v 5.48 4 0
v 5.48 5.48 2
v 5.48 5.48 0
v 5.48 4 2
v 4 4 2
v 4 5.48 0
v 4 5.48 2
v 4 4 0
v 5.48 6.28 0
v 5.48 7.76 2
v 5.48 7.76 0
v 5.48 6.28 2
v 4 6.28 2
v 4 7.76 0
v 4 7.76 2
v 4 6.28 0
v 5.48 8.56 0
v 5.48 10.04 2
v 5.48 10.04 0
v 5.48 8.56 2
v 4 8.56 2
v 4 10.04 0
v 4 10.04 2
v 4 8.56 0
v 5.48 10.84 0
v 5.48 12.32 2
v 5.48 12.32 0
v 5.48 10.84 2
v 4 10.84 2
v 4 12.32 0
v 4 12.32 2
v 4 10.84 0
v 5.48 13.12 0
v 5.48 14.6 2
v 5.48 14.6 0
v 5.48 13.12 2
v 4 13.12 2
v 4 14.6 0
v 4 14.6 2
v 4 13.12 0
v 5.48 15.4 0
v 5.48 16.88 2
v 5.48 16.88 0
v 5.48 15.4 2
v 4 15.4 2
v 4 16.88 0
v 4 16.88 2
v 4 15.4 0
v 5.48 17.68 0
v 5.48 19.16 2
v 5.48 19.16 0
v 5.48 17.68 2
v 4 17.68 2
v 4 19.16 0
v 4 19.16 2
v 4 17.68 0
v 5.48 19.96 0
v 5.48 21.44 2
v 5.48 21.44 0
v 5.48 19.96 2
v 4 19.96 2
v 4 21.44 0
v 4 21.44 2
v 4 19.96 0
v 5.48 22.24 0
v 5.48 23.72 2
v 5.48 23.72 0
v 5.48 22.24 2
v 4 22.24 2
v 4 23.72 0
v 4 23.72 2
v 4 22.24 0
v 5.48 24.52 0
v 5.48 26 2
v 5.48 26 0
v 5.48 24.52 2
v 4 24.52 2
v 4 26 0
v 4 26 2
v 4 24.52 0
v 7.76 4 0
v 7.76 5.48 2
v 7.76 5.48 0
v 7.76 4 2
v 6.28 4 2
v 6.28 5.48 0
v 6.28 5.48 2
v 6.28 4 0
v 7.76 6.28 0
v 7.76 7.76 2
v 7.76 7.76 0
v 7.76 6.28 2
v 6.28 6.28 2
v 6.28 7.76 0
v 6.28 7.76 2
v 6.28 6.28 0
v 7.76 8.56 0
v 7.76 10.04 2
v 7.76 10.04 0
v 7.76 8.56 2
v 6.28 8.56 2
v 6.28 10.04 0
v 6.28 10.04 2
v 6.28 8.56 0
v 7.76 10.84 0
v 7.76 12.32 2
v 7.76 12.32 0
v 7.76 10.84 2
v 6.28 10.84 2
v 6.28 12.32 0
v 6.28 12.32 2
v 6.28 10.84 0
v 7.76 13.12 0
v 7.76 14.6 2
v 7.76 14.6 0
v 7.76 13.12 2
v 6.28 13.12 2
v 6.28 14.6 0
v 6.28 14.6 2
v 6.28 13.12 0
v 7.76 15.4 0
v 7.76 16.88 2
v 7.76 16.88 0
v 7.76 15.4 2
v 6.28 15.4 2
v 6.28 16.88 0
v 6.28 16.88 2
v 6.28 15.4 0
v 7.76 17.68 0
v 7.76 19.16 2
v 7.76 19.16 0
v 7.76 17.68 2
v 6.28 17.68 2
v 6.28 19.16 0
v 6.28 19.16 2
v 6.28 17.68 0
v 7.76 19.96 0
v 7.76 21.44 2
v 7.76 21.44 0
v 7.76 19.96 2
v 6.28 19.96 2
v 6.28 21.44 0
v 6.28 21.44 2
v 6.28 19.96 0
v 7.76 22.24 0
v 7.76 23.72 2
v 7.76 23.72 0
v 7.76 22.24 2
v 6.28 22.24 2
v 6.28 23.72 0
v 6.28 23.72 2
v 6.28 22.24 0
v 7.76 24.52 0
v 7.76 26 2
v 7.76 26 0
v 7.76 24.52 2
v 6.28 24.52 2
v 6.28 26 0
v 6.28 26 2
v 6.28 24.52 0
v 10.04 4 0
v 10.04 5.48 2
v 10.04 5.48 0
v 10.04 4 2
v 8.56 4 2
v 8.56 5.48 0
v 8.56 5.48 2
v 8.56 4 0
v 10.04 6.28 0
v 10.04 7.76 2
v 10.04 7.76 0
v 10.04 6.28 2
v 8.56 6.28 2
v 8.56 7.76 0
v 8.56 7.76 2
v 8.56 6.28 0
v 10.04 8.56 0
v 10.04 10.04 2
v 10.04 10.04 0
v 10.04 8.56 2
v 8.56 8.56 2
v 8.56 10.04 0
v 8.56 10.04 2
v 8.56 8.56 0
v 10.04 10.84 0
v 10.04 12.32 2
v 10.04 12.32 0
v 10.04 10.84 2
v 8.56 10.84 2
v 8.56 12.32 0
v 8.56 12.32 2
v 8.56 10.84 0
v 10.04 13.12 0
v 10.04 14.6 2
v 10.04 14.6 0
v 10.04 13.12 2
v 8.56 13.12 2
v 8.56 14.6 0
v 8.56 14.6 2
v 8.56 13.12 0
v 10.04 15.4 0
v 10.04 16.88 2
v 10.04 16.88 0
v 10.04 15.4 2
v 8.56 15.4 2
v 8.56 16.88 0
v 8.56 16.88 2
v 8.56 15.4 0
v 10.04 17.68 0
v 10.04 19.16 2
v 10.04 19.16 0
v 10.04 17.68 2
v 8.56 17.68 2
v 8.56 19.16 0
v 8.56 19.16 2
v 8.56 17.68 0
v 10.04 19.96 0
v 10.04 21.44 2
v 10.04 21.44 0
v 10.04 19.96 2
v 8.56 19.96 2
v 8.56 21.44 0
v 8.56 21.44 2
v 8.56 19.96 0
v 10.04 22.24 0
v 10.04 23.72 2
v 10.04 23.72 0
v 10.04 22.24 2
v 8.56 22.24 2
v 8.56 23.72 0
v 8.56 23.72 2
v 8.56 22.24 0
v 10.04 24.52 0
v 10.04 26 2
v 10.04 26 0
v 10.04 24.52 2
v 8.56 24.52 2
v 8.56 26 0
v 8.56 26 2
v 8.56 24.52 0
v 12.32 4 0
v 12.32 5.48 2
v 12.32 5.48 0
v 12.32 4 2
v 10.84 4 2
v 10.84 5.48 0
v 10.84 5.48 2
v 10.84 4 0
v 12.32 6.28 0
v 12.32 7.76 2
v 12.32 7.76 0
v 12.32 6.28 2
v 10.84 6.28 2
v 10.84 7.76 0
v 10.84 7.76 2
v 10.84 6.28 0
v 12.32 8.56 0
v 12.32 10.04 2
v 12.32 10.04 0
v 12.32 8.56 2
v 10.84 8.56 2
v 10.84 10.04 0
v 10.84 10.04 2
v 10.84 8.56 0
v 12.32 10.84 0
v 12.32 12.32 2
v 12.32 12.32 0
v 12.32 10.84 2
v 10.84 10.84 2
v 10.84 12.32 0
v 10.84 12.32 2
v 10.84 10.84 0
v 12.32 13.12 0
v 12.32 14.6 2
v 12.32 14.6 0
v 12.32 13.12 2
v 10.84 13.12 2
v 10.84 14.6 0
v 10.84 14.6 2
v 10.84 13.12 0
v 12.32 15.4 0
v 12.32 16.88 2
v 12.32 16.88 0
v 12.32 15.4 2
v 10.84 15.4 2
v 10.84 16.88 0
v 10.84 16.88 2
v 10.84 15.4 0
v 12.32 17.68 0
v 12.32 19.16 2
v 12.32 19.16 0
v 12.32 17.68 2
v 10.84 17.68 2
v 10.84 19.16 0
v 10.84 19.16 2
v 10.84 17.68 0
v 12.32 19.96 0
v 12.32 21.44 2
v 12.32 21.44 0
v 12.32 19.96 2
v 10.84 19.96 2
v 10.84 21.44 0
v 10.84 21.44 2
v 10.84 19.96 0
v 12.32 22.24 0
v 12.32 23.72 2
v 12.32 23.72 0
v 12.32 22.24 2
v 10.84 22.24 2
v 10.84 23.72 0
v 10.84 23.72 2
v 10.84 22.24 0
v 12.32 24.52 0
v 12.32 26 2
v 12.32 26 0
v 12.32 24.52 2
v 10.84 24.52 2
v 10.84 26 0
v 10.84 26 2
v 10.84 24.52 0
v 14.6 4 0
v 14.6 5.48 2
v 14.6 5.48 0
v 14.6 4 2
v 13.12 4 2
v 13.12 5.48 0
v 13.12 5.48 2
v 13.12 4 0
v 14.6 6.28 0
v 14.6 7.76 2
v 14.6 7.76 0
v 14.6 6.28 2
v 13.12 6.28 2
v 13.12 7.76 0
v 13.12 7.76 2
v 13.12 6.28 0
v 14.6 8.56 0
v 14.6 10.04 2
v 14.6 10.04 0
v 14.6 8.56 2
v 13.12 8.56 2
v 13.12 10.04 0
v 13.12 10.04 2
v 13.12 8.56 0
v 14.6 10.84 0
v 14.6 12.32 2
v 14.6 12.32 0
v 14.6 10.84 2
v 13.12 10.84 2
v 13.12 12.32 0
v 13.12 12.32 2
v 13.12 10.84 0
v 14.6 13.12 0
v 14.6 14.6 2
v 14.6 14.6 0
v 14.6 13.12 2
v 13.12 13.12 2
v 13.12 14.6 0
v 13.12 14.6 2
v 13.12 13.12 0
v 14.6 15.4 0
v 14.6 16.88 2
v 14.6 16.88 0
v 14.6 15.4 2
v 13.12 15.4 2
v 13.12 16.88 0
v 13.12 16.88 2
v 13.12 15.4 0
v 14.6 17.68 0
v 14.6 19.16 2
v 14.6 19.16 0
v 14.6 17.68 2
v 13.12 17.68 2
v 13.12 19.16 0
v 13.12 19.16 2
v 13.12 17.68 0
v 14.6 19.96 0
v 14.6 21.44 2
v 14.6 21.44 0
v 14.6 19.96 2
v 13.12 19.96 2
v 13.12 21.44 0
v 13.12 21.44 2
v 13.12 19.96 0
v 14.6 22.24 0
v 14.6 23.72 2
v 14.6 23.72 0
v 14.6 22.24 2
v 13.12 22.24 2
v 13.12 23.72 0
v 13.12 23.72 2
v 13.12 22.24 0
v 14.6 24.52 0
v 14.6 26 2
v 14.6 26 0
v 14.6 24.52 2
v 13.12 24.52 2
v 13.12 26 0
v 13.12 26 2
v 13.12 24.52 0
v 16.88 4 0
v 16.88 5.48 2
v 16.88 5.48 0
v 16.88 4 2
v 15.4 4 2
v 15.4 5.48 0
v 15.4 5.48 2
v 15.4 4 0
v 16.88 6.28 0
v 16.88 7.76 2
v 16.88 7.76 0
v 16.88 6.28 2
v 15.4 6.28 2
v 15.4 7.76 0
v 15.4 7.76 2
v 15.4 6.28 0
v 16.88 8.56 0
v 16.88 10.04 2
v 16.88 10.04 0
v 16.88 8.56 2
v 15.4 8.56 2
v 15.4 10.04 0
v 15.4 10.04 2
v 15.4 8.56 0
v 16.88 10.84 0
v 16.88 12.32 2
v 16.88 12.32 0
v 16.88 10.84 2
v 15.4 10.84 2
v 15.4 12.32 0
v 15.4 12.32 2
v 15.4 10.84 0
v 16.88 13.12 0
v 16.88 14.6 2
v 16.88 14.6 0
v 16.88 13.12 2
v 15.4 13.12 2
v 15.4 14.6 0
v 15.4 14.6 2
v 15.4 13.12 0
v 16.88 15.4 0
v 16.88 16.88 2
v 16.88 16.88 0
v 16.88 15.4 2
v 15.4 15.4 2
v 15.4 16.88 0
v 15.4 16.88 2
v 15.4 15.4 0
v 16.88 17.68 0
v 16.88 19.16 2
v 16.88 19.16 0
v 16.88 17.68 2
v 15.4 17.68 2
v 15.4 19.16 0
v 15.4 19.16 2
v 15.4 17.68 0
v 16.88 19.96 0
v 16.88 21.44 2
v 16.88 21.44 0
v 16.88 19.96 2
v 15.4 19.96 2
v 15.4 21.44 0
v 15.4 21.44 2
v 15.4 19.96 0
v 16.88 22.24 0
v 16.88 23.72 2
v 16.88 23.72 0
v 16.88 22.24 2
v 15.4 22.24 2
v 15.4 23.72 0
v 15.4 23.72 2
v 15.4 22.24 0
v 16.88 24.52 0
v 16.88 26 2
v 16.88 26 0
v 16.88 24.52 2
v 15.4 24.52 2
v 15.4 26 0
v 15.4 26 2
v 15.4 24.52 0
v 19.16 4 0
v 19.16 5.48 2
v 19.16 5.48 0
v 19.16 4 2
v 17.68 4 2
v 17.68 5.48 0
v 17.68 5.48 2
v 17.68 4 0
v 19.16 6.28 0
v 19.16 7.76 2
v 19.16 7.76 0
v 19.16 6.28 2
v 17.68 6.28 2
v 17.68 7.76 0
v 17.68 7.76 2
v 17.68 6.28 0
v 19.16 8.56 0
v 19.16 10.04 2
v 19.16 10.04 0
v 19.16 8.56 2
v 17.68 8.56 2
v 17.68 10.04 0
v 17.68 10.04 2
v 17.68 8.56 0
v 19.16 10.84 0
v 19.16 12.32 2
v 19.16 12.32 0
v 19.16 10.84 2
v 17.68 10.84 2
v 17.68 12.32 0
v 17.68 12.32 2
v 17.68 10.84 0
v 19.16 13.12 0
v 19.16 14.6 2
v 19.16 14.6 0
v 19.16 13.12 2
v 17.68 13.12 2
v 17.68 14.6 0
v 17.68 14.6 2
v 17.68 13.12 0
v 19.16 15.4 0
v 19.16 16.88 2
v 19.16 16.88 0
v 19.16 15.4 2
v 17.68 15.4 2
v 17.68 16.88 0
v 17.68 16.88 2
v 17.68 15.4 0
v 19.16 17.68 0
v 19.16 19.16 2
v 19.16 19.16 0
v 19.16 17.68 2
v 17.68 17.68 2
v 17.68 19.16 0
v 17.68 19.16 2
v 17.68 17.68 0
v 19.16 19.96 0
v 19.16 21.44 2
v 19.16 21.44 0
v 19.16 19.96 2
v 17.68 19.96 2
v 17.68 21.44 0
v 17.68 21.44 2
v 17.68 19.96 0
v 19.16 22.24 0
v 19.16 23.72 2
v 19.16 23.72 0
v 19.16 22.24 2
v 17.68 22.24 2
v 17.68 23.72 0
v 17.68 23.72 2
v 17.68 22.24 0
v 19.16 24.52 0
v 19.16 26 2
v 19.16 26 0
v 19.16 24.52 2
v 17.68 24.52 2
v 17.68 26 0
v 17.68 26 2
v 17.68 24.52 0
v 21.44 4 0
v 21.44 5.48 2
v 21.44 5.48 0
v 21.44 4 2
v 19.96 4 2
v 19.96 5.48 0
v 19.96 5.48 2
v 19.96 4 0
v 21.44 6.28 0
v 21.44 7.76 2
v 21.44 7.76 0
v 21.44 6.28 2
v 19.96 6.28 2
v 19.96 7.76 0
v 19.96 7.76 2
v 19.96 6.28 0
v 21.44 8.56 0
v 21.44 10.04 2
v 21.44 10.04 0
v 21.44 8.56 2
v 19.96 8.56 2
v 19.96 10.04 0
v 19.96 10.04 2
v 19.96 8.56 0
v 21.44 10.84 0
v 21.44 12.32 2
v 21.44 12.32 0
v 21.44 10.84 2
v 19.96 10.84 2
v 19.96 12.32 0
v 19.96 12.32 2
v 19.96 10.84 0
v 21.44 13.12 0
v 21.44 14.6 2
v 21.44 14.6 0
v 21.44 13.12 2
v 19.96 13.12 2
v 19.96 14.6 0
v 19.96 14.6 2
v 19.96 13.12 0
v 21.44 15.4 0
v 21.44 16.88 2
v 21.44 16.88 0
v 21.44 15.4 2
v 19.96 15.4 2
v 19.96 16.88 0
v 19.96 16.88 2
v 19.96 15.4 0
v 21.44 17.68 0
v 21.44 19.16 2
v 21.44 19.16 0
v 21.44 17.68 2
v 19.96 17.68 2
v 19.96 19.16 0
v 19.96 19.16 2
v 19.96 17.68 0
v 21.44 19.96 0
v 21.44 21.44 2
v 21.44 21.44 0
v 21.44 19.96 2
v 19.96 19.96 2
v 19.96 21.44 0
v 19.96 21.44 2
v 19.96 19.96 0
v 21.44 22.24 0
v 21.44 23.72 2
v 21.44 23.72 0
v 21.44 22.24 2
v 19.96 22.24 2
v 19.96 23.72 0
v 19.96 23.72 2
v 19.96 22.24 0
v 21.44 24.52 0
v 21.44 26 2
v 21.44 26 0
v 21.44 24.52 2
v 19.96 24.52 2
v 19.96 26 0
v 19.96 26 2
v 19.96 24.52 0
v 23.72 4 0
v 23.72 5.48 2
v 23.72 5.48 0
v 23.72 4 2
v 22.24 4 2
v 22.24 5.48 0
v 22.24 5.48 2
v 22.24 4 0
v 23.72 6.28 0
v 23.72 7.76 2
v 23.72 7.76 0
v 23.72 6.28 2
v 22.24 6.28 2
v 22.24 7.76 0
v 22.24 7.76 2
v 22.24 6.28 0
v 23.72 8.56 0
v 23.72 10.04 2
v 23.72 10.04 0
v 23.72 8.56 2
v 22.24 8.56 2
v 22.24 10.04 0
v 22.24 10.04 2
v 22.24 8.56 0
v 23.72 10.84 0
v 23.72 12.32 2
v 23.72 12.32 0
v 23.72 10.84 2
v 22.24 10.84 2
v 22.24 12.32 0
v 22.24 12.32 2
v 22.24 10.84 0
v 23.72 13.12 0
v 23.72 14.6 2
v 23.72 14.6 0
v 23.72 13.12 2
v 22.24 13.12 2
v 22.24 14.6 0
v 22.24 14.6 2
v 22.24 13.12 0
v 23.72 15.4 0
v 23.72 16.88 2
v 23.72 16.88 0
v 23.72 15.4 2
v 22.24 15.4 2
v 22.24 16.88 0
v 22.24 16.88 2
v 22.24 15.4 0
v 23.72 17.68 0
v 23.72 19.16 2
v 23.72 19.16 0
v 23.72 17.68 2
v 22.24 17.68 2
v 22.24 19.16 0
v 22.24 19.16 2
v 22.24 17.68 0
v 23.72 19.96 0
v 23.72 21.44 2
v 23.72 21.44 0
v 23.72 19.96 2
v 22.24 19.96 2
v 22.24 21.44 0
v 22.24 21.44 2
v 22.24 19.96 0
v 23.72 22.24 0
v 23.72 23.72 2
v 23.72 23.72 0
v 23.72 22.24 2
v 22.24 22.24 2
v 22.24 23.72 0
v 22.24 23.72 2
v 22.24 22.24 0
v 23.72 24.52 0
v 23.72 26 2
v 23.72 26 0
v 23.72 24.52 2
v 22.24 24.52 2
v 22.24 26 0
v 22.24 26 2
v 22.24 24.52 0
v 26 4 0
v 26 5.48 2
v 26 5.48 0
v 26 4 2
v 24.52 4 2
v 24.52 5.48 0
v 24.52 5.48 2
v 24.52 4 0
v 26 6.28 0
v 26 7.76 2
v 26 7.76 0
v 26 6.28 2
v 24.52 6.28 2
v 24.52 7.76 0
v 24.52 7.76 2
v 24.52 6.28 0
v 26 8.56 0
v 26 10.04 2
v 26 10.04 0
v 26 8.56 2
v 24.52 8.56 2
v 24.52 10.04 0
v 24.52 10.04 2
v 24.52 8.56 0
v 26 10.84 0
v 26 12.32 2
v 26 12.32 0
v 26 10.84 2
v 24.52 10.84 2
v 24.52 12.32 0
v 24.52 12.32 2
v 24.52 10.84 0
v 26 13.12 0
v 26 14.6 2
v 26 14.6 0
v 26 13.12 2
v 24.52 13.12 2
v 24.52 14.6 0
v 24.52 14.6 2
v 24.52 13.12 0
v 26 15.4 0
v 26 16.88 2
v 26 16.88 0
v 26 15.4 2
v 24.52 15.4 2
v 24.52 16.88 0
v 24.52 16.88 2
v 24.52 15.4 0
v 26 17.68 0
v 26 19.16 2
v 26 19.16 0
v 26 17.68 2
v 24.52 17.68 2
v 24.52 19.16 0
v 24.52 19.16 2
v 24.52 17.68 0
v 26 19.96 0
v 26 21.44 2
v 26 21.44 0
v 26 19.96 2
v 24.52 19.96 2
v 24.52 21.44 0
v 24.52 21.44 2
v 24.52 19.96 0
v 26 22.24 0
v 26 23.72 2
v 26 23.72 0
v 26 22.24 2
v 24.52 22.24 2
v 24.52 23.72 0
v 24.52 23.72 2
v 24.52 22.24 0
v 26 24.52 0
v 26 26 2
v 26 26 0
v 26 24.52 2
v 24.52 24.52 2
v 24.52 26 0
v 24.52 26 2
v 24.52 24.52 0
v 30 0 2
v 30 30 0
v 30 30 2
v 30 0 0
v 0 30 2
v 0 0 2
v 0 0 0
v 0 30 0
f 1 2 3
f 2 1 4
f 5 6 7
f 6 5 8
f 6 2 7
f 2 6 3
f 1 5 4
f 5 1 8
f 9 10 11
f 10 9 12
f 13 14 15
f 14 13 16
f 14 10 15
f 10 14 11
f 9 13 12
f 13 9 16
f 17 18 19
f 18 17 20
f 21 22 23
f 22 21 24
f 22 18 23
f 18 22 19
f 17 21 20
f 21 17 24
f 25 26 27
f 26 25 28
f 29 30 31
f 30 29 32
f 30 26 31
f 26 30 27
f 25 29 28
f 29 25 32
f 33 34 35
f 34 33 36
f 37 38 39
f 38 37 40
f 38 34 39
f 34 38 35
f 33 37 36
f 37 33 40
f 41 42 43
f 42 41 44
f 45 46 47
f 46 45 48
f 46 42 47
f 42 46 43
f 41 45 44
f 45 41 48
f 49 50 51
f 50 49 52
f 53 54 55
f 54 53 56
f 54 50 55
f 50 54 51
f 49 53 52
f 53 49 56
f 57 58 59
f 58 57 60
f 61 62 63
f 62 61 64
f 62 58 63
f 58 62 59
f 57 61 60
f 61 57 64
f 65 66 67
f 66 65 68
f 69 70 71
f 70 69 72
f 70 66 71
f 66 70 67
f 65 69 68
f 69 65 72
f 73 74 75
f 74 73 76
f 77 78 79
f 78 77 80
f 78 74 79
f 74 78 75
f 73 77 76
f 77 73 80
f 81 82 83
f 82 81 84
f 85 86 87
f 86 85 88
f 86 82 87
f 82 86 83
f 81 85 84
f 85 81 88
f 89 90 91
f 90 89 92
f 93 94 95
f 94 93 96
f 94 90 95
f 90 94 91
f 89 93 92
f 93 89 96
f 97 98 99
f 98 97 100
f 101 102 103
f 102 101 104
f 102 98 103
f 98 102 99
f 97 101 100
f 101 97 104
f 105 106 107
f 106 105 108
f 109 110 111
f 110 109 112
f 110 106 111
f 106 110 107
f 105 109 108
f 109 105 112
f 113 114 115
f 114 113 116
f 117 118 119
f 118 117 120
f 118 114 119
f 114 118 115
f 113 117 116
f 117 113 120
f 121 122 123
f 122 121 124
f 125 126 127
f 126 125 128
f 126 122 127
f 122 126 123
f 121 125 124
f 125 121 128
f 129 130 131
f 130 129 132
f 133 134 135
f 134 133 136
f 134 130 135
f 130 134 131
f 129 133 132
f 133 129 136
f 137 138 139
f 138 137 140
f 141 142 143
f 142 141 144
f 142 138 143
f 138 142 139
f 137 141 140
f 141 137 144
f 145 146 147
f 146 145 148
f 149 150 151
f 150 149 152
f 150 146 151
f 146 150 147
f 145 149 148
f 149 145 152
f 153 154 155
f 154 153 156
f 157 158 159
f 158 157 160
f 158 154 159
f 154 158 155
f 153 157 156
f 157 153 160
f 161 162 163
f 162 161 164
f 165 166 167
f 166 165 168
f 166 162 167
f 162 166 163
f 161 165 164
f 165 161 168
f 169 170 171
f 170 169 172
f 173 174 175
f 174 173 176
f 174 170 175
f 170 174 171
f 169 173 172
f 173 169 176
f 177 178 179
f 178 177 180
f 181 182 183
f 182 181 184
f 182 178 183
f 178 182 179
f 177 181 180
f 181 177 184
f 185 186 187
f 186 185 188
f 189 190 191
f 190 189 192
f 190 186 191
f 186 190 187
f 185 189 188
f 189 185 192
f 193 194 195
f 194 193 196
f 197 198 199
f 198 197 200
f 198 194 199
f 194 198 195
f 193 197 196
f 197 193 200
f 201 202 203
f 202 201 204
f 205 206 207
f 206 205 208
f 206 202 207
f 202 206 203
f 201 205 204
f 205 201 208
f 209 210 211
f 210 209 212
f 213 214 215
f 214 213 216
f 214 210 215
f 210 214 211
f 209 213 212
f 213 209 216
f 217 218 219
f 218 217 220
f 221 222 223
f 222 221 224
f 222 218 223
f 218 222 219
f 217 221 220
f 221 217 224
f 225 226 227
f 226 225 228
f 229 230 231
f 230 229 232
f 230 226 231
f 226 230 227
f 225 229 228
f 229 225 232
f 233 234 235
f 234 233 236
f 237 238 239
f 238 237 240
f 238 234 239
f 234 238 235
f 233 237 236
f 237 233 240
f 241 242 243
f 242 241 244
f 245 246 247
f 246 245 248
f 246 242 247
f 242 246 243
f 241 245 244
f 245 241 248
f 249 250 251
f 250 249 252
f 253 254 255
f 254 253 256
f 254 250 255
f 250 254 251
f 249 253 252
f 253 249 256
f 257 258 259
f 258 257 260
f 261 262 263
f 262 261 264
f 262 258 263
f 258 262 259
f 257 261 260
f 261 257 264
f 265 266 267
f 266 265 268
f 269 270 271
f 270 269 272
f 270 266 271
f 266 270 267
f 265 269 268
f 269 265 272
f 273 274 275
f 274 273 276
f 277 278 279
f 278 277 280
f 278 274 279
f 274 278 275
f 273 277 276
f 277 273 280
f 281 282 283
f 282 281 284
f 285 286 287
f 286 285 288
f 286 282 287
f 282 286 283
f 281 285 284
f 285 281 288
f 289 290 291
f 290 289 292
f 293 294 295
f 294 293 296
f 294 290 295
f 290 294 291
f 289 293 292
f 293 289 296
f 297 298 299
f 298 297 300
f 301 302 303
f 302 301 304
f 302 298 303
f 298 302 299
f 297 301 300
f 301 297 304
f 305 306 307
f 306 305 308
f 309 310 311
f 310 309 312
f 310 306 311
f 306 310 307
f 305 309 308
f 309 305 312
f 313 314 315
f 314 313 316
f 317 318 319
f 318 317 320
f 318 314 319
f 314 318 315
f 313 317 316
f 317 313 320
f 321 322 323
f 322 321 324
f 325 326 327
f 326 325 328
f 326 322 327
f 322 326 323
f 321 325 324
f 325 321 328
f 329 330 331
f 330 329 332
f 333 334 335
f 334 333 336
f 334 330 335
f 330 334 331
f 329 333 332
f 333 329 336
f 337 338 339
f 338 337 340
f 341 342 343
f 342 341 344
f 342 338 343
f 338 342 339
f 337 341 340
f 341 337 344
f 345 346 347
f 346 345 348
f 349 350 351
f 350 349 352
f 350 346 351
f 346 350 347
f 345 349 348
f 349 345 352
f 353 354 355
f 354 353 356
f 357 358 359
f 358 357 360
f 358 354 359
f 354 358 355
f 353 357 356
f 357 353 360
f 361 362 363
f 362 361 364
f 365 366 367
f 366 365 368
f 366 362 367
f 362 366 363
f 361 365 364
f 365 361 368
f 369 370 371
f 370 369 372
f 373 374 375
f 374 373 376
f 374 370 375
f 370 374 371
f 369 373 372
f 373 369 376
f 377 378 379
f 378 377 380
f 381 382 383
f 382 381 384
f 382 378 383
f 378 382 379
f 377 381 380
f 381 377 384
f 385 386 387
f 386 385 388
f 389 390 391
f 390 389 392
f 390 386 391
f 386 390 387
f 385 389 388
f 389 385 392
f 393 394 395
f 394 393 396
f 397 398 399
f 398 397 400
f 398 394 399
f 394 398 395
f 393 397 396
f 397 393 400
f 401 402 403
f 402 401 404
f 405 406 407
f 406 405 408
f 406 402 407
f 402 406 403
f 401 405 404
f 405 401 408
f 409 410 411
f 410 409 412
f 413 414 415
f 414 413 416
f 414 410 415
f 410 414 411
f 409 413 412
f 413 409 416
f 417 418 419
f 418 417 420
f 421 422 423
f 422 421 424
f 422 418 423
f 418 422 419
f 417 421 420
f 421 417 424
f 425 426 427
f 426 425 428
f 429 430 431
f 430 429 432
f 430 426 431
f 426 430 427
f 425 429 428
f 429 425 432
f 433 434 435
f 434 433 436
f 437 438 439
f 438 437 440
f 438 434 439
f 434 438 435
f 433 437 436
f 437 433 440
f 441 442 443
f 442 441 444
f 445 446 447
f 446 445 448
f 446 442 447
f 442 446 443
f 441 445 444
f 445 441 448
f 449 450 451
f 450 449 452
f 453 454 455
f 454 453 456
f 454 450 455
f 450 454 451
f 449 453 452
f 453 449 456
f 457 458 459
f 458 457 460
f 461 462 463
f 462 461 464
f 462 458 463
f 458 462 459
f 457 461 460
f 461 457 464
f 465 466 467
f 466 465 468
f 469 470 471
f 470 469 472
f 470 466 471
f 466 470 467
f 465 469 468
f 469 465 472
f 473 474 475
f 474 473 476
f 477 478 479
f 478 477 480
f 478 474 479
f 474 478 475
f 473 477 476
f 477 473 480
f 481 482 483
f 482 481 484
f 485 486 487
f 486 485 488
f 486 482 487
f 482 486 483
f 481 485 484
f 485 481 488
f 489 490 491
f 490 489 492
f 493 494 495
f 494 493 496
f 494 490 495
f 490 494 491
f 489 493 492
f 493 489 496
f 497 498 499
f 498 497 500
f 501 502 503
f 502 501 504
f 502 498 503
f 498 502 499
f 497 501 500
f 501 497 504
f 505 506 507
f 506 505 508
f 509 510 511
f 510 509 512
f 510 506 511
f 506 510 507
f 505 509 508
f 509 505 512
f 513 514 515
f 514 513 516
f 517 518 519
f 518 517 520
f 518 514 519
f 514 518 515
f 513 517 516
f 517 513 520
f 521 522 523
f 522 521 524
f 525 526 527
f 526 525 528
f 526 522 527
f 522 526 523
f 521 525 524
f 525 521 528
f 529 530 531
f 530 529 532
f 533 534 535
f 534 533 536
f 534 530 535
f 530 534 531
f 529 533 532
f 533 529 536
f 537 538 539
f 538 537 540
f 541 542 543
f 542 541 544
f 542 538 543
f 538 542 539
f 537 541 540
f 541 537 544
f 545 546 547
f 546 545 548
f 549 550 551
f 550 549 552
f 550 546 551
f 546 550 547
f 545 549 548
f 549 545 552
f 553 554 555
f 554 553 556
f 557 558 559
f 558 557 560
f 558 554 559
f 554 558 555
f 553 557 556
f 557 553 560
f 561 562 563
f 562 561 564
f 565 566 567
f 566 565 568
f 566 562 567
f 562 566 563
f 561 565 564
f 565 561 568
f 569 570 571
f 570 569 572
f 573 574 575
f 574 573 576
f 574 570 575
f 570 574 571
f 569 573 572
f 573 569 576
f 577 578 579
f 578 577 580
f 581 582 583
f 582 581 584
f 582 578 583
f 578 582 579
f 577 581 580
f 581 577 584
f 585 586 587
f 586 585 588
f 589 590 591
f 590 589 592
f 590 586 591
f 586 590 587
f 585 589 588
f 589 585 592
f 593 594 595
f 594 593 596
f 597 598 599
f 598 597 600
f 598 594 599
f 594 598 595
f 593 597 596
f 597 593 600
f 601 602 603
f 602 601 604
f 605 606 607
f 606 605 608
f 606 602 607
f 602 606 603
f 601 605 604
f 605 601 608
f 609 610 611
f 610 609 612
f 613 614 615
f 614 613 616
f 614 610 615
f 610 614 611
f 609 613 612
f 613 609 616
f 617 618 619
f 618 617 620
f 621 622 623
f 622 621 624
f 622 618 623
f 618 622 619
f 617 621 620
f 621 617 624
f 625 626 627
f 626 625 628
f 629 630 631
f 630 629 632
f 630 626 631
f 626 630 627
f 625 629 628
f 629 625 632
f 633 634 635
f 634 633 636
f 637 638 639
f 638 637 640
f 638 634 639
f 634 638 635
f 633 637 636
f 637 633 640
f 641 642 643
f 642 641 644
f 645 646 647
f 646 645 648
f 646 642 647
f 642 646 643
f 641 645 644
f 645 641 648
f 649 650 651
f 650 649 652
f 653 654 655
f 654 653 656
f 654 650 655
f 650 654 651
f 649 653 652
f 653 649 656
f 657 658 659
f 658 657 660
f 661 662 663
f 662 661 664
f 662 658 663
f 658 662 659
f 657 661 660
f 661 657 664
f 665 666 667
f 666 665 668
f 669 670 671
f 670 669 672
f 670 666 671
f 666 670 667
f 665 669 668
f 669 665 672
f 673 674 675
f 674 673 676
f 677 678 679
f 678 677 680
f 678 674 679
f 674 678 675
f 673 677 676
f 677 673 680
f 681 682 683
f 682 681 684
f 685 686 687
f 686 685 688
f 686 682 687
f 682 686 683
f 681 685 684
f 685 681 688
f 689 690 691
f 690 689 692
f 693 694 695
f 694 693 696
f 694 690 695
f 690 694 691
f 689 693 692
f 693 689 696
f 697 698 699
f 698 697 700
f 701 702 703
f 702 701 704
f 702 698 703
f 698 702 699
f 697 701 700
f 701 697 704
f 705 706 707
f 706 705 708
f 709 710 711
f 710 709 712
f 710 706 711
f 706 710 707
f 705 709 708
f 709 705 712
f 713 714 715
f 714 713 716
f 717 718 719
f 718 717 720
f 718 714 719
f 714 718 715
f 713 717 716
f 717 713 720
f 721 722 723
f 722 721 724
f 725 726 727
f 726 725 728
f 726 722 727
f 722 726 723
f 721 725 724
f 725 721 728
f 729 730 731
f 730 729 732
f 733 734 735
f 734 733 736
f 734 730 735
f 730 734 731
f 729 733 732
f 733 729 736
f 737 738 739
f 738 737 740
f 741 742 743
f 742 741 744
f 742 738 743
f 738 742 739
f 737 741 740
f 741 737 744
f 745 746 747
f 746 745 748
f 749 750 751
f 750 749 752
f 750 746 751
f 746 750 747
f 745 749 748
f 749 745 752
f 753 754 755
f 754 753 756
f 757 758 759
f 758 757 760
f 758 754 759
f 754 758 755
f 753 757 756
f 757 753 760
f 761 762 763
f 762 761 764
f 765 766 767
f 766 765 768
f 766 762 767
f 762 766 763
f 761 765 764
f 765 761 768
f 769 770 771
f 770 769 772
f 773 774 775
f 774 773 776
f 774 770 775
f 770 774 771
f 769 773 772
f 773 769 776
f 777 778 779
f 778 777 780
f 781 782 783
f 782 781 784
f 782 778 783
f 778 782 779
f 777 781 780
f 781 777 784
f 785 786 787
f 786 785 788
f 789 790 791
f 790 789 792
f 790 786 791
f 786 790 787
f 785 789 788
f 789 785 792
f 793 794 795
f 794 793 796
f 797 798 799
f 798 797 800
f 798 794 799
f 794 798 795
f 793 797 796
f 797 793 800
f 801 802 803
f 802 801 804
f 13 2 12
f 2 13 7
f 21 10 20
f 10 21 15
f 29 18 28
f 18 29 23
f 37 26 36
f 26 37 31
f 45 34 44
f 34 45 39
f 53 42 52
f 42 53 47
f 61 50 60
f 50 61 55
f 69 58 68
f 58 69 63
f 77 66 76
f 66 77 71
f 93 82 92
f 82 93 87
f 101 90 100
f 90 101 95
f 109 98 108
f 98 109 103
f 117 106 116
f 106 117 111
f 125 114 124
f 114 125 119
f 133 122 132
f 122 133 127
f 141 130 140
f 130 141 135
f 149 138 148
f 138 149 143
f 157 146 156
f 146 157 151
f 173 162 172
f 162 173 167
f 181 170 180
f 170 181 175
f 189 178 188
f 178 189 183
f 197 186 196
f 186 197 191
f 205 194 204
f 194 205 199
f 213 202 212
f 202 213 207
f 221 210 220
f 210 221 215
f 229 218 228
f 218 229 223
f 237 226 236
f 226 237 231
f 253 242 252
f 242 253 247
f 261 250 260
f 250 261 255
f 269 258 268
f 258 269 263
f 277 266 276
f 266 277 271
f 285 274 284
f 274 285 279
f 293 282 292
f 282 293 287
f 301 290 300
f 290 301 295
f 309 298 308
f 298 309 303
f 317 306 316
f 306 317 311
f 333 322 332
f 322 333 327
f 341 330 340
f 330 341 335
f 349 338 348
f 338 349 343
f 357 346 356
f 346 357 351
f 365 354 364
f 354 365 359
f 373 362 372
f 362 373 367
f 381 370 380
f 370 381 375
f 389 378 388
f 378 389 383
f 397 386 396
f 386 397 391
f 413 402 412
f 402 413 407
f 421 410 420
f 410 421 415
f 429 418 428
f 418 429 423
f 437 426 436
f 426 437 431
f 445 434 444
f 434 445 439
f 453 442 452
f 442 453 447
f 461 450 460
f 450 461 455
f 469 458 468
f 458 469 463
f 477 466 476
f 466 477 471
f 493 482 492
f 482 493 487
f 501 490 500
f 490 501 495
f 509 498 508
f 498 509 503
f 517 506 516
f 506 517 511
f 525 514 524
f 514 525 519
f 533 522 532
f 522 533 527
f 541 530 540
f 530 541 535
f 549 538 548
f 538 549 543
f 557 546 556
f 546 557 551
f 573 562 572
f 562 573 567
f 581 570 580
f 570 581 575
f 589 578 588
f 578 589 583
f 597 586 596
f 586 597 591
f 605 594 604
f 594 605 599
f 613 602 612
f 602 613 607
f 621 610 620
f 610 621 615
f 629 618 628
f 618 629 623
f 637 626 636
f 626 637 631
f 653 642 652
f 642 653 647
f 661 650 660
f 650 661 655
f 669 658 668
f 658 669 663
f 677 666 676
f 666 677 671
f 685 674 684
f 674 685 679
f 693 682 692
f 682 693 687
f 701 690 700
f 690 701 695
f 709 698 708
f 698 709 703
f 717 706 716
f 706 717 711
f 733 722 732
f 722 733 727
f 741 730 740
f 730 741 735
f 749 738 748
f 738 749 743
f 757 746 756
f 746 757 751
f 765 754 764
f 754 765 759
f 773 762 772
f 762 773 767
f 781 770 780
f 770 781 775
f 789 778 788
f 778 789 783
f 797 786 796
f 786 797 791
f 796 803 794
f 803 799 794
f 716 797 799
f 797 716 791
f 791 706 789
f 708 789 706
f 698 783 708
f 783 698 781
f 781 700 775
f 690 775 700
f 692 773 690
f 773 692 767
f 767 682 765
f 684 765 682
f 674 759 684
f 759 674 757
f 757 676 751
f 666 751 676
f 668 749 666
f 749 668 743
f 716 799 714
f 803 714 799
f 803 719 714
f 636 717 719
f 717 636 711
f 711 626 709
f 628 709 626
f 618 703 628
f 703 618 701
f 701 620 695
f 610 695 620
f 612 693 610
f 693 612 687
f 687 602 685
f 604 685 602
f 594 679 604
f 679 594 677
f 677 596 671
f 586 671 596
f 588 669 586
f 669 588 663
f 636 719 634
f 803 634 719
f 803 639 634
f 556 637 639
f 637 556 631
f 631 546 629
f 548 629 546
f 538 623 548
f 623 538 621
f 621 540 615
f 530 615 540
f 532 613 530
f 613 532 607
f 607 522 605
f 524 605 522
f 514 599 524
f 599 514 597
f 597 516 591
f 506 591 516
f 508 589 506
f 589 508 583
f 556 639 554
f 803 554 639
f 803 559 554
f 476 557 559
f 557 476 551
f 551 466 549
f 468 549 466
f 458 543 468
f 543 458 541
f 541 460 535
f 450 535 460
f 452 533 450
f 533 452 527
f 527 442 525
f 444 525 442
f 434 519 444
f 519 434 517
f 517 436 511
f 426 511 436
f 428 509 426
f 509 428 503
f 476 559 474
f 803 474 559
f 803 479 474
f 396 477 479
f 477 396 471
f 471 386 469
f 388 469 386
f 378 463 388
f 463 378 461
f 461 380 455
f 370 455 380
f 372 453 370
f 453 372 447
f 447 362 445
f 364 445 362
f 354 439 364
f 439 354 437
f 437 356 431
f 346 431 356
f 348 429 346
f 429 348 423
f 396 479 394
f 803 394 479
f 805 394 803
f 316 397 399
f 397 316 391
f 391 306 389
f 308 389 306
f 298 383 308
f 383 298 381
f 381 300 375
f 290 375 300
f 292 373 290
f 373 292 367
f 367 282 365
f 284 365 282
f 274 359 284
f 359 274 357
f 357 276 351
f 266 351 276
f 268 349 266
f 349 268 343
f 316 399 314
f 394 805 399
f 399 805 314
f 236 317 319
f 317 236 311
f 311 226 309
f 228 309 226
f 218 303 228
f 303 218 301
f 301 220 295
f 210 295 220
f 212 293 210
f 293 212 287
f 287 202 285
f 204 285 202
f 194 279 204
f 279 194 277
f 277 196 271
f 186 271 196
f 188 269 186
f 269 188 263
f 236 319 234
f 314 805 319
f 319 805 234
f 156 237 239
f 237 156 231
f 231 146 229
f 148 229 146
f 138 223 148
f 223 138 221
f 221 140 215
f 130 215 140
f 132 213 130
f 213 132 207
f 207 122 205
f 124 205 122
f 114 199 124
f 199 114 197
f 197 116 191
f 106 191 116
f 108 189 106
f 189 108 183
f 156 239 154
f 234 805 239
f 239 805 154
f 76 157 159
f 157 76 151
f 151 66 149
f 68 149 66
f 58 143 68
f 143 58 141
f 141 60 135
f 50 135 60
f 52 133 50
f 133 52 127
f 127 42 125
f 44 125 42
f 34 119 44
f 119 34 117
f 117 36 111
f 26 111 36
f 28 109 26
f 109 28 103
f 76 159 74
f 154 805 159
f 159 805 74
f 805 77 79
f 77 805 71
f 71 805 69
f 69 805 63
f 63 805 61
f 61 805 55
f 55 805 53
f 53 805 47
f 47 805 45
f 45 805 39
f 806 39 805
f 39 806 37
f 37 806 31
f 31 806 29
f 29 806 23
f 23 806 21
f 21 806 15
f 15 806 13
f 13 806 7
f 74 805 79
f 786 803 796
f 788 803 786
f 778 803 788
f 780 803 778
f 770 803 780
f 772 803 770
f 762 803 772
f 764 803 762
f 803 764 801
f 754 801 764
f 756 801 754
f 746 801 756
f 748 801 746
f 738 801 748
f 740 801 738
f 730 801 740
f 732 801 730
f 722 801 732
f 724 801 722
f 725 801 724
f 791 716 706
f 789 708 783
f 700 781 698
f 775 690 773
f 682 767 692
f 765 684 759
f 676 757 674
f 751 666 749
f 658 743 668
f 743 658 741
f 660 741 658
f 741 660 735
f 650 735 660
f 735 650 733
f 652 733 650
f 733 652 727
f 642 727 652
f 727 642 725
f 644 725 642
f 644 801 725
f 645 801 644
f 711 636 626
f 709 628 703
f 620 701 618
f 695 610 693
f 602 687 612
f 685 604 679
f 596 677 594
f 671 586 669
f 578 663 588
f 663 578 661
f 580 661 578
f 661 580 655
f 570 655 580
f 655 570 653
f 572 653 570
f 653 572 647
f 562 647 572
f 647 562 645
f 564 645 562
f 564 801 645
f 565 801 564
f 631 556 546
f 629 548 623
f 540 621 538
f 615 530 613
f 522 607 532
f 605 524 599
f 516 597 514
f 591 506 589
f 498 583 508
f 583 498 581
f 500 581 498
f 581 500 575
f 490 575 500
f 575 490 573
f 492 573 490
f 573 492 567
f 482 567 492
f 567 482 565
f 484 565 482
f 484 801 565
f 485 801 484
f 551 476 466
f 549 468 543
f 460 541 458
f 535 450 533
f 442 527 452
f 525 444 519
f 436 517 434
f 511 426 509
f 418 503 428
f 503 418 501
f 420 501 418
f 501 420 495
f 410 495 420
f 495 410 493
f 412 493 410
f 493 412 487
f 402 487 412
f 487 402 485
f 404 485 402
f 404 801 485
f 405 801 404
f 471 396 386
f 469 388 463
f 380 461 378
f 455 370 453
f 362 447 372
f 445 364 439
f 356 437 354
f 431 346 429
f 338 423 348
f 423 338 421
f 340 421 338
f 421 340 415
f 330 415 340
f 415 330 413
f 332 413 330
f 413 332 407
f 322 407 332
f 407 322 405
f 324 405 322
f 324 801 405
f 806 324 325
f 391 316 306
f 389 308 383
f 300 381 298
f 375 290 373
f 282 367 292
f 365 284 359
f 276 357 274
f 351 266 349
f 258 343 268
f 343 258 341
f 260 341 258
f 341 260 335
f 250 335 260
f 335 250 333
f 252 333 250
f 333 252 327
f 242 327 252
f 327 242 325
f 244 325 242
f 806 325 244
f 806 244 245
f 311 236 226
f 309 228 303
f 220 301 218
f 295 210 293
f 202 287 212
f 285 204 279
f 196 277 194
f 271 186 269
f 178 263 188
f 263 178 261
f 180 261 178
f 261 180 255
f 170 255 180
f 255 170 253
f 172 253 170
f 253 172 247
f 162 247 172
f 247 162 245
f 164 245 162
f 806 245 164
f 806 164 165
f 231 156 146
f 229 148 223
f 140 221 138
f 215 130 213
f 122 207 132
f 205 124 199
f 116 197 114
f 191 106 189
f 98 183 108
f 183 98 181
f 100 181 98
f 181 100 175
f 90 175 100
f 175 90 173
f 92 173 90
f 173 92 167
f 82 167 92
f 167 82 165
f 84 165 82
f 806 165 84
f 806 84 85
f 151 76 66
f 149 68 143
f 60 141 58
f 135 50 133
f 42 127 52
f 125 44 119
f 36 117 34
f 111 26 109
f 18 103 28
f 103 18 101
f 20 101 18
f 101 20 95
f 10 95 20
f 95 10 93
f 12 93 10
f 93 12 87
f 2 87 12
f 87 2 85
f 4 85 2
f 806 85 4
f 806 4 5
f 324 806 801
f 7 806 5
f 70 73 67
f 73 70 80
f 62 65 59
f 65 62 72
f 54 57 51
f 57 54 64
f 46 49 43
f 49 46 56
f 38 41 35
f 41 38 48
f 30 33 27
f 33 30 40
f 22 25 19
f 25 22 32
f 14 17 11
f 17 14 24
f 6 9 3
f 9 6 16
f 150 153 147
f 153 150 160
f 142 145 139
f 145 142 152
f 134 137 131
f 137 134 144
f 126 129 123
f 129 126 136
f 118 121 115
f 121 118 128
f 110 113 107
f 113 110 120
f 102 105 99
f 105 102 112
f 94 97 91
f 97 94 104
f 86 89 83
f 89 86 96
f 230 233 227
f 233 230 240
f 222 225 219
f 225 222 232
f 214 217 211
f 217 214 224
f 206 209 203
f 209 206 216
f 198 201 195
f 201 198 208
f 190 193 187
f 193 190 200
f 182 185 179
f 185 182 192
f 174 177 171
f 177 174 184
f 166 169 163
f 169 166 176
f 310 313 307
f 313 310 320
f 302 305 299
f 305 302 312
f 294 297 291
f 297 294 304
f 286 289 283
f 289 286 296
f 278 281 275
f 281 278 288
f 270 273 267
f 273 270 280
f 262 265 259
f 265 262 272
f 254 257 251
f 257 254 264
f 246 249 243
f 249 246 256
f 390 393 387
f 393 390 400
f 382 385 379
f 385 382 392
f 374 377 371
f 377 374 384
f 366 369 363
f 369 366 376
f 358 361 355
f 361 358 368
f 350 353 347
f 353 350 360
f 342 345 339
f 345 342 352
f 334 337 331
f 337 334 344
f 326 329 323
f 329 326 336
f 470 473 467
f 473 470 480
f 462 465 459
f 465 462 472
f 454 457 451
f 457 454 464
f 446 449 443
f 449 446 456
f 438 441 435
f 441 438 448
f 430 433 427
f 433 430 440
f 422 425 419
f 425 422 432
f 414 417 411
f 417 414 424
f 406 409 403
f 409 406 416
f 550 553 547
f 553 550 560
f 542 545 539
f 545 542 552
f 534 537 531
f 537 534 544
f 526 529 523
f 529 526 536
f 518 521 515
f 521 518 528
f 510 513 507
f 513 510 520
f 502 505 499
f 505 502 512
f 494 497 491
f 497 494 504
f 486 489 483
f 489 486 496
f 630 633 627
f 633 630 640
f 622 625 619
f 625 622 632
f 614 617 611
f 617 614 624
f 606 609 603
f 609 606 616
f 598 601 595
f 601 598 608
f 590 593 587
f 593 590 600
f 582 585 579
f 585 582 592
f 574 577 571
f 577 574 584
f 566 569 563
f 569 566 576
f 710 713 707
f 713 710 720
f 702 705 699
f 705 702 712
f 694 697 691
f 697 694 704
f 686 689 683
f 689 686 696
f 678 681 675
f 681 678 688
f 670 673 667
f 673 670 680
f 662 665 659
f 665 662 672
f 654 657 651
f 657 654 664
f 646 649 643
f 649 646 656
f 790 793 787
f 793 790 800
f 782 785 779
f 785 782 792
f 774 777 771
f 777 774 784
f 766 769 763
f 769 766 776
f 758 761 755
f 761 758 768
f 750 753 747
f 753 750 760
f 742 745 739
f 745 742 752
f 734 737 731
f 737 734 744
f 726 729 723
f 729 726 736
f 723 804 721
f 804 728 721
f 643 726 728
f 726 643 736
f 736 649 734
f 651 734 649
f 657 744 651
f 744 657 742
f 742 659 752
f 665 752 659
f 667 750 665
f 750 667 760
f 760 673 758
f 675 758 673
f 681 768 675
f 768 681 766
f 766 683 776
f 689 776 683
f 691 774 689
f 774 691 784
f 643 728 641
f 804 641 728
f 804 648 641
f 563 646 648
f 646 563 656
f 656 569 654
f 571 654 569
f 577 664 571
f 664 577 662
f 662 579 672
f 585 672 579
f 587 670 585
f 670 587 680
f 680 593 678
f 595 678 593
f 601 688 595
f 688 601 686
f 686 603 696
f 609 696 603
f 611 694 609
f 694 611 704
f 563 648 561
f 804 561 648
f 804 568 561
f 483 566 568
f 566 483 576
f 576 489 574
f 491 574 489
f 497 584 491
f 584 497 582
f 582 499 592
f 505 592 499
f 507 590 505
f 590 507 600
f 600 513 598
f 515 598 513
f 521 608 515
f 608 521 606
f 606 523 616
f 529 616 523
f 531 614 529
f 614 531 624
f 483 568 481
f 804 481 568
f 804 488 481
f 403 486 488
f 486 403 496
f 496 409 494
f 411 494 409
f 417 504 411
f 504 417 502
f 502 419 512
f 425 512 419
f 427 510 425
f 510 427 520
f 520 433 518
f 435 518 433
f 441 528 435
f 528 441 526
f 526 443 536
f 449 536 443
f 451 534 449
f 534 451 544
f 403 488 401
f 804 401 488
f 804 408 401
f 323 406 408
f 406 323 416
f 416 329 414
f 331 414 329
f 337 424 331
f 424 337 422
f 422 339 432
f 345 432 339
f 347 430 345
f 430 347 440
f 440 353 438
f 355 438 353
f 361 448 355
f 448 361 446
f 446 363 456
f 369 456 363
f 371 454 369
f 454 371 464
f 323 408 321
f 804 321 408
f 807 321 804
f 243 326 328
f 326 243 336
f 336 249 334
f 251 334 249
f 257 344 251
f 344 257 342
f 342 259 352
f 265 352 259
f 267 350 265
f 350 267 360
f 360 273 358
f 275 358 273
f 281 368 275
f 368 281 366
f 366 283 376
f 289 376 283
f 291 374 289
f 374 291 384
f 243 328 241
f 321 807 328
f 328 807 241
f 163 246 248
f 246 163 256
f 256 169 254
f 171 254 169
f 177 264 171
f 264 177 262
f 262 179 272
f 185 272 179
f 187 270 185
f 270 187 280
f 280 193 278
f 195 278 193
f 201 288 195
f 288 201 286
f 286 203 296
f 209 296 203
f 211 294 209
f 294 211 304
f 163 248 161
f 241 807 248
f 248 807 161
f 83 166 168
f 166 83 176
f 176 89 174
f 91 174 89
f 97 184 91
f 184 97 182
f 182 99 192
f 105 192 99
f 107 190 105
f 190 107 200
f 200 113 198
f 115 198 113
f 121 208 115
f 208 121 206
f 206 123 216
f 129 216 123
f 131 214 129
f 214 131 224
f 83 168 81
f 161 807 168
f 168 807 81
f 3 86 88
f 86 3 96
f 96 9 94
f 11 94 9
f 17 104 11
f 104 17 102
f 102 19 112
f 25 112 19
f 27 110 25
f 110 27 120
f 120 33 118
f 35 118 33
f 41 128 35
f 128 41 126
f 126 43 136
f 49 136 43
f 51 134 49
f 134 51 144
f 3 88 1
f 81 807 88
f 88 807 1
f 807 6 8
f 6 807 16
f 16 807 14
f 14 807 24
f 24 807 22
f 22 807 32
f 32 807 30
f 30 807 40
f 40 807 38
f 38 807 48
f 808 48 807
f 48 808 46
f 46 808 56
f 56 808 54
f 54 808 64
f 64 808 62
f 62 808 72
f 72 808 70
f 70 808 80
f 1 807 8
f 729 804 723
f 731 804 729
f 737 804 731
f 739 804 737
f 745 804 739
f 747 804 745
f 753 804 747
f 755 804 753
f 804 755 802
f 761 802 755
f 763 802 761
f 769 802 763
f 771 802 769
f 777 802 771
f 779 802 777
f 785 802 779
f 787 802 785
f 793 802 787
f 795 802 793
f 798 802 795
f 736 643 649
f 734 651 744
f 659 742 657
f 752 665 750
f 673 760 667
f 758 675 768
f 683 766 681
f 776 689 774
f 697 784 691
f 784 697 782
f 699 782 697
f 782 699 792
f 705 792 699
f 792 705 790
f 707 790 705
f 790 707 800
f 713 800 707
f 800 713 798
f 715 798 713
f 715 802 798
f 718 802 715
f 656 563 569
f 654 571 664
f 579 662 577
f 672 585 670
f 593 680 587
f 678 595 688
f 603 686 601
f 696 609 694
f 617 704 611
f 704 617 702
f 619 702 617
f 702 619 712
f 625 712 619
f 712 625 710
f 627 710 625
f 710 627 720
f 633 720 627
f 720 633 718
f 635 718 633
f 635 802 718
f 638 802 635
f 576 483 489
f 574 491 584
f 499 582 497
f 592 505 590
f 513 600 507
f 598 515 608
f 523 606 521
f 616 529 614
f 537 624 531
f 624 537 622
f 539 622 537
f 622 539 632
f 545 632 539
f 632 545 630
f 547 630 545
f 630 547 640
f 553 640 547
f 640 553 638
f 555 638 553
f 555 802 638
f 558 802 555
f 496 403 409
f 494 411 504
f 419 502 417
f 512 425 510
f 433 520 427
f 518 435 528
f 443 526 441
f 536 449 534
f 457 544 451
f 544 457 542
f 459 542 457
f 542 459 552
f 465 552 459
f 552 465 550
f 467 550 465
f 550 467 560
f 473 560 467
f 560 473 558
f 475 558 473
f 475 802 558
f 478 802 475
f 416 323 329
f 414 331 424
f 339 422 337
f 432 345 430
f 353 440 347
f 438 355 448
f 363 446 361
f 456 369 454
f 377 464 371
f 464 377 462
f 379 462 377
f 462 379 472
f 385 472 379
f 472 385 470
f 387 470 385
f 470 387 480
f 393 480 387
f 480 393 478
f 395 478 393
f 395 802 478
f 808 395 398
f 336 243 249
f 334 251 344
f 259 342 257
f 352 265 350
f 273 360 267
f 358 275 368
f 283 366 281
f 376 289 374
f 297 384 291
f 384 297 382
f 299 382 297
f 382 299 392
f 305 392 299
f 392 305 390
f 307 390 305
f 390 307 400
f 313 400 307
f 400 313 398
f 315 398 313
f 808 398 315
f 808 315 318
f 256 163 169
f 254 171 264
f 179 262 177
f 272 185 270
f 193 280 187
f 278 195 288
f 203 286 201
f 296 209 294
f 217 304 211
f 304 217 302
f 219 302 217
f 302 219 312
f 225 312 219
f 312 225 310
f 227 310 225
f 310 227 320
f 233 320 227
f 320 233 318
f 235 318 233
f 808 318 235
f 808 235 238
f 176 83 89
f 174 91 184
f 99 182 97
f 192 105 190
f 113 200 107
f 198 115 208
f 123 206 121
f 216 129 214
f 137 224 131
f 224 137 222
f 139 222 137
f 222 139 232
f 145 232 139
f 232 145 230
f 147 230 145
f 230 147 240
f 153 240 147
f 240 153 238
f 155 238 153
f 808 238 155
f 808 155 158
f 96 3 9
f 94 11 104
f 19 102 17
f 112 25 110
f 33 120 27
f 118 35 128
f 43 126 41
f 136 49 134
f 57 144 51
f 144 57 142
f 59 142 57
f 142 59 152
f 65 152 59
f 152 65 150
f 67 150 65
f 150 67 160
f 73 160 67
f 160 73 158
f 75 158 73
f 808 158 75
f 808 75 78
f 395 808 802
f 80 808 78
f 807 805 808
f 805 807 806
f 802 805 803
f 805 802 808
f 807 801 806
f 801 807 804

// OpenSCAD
// Grid
// By Dana Woodman <dana@danawoodman.com>


// Settings
//--------------------------

/* [Global] */

// The width of the exported file.
width = 30;

// The height of the exported file.
height = 30;

// The number of columns to generate.
cols = 10;

// The number of rows to generate.
rows = 10;

// The border around the grids/slats
border = 4;

// The spacing between rows/columns.
spacing = .8;

//thickness
thickness = 2;

/* [Hidden] */

// The magic...
//--------------------------

// Calculated inner width of dispaly area.
innerWidth = (width - (2 * border));
innerHeight = (height - (2 * border));
//echo("innerWidth", innerWidth, "innerHeight", innerHeight);

// Calculate size of the squares.
function dimension(size, divisions) = (size - ((divisions - 1) * spacing)) / divisions;
xWidth = dimension(innerWidth, cols);
yWidth = dimension(innerHeight, rows);
//echo("xWidth", xWidth, "yWidth", yWidth);

function calculate_location(size, index, spacing) = (size + spacing) * index;

eps=.001;
// Subtract the squares from the display area.
difference() {

	// The display area.
	cube(size=[width, height,thickness]);

	// Offset by border size.
	translate([border, border,-eps])

		// Iterate over all the columns.
		for (col = [0 : cols - 1]) {
			
			// Iterate over all the rows.
			for (row = [0 : rows - 1]) {

				// Caclulate position of each square
				translate([
					calculate_location(xWidth, col, spacing), 
					calculate_location(yWidth, row, spacing)
				])
					cube(size=[xWidth, yWidth,2*thickness]);
			}
		}
}
